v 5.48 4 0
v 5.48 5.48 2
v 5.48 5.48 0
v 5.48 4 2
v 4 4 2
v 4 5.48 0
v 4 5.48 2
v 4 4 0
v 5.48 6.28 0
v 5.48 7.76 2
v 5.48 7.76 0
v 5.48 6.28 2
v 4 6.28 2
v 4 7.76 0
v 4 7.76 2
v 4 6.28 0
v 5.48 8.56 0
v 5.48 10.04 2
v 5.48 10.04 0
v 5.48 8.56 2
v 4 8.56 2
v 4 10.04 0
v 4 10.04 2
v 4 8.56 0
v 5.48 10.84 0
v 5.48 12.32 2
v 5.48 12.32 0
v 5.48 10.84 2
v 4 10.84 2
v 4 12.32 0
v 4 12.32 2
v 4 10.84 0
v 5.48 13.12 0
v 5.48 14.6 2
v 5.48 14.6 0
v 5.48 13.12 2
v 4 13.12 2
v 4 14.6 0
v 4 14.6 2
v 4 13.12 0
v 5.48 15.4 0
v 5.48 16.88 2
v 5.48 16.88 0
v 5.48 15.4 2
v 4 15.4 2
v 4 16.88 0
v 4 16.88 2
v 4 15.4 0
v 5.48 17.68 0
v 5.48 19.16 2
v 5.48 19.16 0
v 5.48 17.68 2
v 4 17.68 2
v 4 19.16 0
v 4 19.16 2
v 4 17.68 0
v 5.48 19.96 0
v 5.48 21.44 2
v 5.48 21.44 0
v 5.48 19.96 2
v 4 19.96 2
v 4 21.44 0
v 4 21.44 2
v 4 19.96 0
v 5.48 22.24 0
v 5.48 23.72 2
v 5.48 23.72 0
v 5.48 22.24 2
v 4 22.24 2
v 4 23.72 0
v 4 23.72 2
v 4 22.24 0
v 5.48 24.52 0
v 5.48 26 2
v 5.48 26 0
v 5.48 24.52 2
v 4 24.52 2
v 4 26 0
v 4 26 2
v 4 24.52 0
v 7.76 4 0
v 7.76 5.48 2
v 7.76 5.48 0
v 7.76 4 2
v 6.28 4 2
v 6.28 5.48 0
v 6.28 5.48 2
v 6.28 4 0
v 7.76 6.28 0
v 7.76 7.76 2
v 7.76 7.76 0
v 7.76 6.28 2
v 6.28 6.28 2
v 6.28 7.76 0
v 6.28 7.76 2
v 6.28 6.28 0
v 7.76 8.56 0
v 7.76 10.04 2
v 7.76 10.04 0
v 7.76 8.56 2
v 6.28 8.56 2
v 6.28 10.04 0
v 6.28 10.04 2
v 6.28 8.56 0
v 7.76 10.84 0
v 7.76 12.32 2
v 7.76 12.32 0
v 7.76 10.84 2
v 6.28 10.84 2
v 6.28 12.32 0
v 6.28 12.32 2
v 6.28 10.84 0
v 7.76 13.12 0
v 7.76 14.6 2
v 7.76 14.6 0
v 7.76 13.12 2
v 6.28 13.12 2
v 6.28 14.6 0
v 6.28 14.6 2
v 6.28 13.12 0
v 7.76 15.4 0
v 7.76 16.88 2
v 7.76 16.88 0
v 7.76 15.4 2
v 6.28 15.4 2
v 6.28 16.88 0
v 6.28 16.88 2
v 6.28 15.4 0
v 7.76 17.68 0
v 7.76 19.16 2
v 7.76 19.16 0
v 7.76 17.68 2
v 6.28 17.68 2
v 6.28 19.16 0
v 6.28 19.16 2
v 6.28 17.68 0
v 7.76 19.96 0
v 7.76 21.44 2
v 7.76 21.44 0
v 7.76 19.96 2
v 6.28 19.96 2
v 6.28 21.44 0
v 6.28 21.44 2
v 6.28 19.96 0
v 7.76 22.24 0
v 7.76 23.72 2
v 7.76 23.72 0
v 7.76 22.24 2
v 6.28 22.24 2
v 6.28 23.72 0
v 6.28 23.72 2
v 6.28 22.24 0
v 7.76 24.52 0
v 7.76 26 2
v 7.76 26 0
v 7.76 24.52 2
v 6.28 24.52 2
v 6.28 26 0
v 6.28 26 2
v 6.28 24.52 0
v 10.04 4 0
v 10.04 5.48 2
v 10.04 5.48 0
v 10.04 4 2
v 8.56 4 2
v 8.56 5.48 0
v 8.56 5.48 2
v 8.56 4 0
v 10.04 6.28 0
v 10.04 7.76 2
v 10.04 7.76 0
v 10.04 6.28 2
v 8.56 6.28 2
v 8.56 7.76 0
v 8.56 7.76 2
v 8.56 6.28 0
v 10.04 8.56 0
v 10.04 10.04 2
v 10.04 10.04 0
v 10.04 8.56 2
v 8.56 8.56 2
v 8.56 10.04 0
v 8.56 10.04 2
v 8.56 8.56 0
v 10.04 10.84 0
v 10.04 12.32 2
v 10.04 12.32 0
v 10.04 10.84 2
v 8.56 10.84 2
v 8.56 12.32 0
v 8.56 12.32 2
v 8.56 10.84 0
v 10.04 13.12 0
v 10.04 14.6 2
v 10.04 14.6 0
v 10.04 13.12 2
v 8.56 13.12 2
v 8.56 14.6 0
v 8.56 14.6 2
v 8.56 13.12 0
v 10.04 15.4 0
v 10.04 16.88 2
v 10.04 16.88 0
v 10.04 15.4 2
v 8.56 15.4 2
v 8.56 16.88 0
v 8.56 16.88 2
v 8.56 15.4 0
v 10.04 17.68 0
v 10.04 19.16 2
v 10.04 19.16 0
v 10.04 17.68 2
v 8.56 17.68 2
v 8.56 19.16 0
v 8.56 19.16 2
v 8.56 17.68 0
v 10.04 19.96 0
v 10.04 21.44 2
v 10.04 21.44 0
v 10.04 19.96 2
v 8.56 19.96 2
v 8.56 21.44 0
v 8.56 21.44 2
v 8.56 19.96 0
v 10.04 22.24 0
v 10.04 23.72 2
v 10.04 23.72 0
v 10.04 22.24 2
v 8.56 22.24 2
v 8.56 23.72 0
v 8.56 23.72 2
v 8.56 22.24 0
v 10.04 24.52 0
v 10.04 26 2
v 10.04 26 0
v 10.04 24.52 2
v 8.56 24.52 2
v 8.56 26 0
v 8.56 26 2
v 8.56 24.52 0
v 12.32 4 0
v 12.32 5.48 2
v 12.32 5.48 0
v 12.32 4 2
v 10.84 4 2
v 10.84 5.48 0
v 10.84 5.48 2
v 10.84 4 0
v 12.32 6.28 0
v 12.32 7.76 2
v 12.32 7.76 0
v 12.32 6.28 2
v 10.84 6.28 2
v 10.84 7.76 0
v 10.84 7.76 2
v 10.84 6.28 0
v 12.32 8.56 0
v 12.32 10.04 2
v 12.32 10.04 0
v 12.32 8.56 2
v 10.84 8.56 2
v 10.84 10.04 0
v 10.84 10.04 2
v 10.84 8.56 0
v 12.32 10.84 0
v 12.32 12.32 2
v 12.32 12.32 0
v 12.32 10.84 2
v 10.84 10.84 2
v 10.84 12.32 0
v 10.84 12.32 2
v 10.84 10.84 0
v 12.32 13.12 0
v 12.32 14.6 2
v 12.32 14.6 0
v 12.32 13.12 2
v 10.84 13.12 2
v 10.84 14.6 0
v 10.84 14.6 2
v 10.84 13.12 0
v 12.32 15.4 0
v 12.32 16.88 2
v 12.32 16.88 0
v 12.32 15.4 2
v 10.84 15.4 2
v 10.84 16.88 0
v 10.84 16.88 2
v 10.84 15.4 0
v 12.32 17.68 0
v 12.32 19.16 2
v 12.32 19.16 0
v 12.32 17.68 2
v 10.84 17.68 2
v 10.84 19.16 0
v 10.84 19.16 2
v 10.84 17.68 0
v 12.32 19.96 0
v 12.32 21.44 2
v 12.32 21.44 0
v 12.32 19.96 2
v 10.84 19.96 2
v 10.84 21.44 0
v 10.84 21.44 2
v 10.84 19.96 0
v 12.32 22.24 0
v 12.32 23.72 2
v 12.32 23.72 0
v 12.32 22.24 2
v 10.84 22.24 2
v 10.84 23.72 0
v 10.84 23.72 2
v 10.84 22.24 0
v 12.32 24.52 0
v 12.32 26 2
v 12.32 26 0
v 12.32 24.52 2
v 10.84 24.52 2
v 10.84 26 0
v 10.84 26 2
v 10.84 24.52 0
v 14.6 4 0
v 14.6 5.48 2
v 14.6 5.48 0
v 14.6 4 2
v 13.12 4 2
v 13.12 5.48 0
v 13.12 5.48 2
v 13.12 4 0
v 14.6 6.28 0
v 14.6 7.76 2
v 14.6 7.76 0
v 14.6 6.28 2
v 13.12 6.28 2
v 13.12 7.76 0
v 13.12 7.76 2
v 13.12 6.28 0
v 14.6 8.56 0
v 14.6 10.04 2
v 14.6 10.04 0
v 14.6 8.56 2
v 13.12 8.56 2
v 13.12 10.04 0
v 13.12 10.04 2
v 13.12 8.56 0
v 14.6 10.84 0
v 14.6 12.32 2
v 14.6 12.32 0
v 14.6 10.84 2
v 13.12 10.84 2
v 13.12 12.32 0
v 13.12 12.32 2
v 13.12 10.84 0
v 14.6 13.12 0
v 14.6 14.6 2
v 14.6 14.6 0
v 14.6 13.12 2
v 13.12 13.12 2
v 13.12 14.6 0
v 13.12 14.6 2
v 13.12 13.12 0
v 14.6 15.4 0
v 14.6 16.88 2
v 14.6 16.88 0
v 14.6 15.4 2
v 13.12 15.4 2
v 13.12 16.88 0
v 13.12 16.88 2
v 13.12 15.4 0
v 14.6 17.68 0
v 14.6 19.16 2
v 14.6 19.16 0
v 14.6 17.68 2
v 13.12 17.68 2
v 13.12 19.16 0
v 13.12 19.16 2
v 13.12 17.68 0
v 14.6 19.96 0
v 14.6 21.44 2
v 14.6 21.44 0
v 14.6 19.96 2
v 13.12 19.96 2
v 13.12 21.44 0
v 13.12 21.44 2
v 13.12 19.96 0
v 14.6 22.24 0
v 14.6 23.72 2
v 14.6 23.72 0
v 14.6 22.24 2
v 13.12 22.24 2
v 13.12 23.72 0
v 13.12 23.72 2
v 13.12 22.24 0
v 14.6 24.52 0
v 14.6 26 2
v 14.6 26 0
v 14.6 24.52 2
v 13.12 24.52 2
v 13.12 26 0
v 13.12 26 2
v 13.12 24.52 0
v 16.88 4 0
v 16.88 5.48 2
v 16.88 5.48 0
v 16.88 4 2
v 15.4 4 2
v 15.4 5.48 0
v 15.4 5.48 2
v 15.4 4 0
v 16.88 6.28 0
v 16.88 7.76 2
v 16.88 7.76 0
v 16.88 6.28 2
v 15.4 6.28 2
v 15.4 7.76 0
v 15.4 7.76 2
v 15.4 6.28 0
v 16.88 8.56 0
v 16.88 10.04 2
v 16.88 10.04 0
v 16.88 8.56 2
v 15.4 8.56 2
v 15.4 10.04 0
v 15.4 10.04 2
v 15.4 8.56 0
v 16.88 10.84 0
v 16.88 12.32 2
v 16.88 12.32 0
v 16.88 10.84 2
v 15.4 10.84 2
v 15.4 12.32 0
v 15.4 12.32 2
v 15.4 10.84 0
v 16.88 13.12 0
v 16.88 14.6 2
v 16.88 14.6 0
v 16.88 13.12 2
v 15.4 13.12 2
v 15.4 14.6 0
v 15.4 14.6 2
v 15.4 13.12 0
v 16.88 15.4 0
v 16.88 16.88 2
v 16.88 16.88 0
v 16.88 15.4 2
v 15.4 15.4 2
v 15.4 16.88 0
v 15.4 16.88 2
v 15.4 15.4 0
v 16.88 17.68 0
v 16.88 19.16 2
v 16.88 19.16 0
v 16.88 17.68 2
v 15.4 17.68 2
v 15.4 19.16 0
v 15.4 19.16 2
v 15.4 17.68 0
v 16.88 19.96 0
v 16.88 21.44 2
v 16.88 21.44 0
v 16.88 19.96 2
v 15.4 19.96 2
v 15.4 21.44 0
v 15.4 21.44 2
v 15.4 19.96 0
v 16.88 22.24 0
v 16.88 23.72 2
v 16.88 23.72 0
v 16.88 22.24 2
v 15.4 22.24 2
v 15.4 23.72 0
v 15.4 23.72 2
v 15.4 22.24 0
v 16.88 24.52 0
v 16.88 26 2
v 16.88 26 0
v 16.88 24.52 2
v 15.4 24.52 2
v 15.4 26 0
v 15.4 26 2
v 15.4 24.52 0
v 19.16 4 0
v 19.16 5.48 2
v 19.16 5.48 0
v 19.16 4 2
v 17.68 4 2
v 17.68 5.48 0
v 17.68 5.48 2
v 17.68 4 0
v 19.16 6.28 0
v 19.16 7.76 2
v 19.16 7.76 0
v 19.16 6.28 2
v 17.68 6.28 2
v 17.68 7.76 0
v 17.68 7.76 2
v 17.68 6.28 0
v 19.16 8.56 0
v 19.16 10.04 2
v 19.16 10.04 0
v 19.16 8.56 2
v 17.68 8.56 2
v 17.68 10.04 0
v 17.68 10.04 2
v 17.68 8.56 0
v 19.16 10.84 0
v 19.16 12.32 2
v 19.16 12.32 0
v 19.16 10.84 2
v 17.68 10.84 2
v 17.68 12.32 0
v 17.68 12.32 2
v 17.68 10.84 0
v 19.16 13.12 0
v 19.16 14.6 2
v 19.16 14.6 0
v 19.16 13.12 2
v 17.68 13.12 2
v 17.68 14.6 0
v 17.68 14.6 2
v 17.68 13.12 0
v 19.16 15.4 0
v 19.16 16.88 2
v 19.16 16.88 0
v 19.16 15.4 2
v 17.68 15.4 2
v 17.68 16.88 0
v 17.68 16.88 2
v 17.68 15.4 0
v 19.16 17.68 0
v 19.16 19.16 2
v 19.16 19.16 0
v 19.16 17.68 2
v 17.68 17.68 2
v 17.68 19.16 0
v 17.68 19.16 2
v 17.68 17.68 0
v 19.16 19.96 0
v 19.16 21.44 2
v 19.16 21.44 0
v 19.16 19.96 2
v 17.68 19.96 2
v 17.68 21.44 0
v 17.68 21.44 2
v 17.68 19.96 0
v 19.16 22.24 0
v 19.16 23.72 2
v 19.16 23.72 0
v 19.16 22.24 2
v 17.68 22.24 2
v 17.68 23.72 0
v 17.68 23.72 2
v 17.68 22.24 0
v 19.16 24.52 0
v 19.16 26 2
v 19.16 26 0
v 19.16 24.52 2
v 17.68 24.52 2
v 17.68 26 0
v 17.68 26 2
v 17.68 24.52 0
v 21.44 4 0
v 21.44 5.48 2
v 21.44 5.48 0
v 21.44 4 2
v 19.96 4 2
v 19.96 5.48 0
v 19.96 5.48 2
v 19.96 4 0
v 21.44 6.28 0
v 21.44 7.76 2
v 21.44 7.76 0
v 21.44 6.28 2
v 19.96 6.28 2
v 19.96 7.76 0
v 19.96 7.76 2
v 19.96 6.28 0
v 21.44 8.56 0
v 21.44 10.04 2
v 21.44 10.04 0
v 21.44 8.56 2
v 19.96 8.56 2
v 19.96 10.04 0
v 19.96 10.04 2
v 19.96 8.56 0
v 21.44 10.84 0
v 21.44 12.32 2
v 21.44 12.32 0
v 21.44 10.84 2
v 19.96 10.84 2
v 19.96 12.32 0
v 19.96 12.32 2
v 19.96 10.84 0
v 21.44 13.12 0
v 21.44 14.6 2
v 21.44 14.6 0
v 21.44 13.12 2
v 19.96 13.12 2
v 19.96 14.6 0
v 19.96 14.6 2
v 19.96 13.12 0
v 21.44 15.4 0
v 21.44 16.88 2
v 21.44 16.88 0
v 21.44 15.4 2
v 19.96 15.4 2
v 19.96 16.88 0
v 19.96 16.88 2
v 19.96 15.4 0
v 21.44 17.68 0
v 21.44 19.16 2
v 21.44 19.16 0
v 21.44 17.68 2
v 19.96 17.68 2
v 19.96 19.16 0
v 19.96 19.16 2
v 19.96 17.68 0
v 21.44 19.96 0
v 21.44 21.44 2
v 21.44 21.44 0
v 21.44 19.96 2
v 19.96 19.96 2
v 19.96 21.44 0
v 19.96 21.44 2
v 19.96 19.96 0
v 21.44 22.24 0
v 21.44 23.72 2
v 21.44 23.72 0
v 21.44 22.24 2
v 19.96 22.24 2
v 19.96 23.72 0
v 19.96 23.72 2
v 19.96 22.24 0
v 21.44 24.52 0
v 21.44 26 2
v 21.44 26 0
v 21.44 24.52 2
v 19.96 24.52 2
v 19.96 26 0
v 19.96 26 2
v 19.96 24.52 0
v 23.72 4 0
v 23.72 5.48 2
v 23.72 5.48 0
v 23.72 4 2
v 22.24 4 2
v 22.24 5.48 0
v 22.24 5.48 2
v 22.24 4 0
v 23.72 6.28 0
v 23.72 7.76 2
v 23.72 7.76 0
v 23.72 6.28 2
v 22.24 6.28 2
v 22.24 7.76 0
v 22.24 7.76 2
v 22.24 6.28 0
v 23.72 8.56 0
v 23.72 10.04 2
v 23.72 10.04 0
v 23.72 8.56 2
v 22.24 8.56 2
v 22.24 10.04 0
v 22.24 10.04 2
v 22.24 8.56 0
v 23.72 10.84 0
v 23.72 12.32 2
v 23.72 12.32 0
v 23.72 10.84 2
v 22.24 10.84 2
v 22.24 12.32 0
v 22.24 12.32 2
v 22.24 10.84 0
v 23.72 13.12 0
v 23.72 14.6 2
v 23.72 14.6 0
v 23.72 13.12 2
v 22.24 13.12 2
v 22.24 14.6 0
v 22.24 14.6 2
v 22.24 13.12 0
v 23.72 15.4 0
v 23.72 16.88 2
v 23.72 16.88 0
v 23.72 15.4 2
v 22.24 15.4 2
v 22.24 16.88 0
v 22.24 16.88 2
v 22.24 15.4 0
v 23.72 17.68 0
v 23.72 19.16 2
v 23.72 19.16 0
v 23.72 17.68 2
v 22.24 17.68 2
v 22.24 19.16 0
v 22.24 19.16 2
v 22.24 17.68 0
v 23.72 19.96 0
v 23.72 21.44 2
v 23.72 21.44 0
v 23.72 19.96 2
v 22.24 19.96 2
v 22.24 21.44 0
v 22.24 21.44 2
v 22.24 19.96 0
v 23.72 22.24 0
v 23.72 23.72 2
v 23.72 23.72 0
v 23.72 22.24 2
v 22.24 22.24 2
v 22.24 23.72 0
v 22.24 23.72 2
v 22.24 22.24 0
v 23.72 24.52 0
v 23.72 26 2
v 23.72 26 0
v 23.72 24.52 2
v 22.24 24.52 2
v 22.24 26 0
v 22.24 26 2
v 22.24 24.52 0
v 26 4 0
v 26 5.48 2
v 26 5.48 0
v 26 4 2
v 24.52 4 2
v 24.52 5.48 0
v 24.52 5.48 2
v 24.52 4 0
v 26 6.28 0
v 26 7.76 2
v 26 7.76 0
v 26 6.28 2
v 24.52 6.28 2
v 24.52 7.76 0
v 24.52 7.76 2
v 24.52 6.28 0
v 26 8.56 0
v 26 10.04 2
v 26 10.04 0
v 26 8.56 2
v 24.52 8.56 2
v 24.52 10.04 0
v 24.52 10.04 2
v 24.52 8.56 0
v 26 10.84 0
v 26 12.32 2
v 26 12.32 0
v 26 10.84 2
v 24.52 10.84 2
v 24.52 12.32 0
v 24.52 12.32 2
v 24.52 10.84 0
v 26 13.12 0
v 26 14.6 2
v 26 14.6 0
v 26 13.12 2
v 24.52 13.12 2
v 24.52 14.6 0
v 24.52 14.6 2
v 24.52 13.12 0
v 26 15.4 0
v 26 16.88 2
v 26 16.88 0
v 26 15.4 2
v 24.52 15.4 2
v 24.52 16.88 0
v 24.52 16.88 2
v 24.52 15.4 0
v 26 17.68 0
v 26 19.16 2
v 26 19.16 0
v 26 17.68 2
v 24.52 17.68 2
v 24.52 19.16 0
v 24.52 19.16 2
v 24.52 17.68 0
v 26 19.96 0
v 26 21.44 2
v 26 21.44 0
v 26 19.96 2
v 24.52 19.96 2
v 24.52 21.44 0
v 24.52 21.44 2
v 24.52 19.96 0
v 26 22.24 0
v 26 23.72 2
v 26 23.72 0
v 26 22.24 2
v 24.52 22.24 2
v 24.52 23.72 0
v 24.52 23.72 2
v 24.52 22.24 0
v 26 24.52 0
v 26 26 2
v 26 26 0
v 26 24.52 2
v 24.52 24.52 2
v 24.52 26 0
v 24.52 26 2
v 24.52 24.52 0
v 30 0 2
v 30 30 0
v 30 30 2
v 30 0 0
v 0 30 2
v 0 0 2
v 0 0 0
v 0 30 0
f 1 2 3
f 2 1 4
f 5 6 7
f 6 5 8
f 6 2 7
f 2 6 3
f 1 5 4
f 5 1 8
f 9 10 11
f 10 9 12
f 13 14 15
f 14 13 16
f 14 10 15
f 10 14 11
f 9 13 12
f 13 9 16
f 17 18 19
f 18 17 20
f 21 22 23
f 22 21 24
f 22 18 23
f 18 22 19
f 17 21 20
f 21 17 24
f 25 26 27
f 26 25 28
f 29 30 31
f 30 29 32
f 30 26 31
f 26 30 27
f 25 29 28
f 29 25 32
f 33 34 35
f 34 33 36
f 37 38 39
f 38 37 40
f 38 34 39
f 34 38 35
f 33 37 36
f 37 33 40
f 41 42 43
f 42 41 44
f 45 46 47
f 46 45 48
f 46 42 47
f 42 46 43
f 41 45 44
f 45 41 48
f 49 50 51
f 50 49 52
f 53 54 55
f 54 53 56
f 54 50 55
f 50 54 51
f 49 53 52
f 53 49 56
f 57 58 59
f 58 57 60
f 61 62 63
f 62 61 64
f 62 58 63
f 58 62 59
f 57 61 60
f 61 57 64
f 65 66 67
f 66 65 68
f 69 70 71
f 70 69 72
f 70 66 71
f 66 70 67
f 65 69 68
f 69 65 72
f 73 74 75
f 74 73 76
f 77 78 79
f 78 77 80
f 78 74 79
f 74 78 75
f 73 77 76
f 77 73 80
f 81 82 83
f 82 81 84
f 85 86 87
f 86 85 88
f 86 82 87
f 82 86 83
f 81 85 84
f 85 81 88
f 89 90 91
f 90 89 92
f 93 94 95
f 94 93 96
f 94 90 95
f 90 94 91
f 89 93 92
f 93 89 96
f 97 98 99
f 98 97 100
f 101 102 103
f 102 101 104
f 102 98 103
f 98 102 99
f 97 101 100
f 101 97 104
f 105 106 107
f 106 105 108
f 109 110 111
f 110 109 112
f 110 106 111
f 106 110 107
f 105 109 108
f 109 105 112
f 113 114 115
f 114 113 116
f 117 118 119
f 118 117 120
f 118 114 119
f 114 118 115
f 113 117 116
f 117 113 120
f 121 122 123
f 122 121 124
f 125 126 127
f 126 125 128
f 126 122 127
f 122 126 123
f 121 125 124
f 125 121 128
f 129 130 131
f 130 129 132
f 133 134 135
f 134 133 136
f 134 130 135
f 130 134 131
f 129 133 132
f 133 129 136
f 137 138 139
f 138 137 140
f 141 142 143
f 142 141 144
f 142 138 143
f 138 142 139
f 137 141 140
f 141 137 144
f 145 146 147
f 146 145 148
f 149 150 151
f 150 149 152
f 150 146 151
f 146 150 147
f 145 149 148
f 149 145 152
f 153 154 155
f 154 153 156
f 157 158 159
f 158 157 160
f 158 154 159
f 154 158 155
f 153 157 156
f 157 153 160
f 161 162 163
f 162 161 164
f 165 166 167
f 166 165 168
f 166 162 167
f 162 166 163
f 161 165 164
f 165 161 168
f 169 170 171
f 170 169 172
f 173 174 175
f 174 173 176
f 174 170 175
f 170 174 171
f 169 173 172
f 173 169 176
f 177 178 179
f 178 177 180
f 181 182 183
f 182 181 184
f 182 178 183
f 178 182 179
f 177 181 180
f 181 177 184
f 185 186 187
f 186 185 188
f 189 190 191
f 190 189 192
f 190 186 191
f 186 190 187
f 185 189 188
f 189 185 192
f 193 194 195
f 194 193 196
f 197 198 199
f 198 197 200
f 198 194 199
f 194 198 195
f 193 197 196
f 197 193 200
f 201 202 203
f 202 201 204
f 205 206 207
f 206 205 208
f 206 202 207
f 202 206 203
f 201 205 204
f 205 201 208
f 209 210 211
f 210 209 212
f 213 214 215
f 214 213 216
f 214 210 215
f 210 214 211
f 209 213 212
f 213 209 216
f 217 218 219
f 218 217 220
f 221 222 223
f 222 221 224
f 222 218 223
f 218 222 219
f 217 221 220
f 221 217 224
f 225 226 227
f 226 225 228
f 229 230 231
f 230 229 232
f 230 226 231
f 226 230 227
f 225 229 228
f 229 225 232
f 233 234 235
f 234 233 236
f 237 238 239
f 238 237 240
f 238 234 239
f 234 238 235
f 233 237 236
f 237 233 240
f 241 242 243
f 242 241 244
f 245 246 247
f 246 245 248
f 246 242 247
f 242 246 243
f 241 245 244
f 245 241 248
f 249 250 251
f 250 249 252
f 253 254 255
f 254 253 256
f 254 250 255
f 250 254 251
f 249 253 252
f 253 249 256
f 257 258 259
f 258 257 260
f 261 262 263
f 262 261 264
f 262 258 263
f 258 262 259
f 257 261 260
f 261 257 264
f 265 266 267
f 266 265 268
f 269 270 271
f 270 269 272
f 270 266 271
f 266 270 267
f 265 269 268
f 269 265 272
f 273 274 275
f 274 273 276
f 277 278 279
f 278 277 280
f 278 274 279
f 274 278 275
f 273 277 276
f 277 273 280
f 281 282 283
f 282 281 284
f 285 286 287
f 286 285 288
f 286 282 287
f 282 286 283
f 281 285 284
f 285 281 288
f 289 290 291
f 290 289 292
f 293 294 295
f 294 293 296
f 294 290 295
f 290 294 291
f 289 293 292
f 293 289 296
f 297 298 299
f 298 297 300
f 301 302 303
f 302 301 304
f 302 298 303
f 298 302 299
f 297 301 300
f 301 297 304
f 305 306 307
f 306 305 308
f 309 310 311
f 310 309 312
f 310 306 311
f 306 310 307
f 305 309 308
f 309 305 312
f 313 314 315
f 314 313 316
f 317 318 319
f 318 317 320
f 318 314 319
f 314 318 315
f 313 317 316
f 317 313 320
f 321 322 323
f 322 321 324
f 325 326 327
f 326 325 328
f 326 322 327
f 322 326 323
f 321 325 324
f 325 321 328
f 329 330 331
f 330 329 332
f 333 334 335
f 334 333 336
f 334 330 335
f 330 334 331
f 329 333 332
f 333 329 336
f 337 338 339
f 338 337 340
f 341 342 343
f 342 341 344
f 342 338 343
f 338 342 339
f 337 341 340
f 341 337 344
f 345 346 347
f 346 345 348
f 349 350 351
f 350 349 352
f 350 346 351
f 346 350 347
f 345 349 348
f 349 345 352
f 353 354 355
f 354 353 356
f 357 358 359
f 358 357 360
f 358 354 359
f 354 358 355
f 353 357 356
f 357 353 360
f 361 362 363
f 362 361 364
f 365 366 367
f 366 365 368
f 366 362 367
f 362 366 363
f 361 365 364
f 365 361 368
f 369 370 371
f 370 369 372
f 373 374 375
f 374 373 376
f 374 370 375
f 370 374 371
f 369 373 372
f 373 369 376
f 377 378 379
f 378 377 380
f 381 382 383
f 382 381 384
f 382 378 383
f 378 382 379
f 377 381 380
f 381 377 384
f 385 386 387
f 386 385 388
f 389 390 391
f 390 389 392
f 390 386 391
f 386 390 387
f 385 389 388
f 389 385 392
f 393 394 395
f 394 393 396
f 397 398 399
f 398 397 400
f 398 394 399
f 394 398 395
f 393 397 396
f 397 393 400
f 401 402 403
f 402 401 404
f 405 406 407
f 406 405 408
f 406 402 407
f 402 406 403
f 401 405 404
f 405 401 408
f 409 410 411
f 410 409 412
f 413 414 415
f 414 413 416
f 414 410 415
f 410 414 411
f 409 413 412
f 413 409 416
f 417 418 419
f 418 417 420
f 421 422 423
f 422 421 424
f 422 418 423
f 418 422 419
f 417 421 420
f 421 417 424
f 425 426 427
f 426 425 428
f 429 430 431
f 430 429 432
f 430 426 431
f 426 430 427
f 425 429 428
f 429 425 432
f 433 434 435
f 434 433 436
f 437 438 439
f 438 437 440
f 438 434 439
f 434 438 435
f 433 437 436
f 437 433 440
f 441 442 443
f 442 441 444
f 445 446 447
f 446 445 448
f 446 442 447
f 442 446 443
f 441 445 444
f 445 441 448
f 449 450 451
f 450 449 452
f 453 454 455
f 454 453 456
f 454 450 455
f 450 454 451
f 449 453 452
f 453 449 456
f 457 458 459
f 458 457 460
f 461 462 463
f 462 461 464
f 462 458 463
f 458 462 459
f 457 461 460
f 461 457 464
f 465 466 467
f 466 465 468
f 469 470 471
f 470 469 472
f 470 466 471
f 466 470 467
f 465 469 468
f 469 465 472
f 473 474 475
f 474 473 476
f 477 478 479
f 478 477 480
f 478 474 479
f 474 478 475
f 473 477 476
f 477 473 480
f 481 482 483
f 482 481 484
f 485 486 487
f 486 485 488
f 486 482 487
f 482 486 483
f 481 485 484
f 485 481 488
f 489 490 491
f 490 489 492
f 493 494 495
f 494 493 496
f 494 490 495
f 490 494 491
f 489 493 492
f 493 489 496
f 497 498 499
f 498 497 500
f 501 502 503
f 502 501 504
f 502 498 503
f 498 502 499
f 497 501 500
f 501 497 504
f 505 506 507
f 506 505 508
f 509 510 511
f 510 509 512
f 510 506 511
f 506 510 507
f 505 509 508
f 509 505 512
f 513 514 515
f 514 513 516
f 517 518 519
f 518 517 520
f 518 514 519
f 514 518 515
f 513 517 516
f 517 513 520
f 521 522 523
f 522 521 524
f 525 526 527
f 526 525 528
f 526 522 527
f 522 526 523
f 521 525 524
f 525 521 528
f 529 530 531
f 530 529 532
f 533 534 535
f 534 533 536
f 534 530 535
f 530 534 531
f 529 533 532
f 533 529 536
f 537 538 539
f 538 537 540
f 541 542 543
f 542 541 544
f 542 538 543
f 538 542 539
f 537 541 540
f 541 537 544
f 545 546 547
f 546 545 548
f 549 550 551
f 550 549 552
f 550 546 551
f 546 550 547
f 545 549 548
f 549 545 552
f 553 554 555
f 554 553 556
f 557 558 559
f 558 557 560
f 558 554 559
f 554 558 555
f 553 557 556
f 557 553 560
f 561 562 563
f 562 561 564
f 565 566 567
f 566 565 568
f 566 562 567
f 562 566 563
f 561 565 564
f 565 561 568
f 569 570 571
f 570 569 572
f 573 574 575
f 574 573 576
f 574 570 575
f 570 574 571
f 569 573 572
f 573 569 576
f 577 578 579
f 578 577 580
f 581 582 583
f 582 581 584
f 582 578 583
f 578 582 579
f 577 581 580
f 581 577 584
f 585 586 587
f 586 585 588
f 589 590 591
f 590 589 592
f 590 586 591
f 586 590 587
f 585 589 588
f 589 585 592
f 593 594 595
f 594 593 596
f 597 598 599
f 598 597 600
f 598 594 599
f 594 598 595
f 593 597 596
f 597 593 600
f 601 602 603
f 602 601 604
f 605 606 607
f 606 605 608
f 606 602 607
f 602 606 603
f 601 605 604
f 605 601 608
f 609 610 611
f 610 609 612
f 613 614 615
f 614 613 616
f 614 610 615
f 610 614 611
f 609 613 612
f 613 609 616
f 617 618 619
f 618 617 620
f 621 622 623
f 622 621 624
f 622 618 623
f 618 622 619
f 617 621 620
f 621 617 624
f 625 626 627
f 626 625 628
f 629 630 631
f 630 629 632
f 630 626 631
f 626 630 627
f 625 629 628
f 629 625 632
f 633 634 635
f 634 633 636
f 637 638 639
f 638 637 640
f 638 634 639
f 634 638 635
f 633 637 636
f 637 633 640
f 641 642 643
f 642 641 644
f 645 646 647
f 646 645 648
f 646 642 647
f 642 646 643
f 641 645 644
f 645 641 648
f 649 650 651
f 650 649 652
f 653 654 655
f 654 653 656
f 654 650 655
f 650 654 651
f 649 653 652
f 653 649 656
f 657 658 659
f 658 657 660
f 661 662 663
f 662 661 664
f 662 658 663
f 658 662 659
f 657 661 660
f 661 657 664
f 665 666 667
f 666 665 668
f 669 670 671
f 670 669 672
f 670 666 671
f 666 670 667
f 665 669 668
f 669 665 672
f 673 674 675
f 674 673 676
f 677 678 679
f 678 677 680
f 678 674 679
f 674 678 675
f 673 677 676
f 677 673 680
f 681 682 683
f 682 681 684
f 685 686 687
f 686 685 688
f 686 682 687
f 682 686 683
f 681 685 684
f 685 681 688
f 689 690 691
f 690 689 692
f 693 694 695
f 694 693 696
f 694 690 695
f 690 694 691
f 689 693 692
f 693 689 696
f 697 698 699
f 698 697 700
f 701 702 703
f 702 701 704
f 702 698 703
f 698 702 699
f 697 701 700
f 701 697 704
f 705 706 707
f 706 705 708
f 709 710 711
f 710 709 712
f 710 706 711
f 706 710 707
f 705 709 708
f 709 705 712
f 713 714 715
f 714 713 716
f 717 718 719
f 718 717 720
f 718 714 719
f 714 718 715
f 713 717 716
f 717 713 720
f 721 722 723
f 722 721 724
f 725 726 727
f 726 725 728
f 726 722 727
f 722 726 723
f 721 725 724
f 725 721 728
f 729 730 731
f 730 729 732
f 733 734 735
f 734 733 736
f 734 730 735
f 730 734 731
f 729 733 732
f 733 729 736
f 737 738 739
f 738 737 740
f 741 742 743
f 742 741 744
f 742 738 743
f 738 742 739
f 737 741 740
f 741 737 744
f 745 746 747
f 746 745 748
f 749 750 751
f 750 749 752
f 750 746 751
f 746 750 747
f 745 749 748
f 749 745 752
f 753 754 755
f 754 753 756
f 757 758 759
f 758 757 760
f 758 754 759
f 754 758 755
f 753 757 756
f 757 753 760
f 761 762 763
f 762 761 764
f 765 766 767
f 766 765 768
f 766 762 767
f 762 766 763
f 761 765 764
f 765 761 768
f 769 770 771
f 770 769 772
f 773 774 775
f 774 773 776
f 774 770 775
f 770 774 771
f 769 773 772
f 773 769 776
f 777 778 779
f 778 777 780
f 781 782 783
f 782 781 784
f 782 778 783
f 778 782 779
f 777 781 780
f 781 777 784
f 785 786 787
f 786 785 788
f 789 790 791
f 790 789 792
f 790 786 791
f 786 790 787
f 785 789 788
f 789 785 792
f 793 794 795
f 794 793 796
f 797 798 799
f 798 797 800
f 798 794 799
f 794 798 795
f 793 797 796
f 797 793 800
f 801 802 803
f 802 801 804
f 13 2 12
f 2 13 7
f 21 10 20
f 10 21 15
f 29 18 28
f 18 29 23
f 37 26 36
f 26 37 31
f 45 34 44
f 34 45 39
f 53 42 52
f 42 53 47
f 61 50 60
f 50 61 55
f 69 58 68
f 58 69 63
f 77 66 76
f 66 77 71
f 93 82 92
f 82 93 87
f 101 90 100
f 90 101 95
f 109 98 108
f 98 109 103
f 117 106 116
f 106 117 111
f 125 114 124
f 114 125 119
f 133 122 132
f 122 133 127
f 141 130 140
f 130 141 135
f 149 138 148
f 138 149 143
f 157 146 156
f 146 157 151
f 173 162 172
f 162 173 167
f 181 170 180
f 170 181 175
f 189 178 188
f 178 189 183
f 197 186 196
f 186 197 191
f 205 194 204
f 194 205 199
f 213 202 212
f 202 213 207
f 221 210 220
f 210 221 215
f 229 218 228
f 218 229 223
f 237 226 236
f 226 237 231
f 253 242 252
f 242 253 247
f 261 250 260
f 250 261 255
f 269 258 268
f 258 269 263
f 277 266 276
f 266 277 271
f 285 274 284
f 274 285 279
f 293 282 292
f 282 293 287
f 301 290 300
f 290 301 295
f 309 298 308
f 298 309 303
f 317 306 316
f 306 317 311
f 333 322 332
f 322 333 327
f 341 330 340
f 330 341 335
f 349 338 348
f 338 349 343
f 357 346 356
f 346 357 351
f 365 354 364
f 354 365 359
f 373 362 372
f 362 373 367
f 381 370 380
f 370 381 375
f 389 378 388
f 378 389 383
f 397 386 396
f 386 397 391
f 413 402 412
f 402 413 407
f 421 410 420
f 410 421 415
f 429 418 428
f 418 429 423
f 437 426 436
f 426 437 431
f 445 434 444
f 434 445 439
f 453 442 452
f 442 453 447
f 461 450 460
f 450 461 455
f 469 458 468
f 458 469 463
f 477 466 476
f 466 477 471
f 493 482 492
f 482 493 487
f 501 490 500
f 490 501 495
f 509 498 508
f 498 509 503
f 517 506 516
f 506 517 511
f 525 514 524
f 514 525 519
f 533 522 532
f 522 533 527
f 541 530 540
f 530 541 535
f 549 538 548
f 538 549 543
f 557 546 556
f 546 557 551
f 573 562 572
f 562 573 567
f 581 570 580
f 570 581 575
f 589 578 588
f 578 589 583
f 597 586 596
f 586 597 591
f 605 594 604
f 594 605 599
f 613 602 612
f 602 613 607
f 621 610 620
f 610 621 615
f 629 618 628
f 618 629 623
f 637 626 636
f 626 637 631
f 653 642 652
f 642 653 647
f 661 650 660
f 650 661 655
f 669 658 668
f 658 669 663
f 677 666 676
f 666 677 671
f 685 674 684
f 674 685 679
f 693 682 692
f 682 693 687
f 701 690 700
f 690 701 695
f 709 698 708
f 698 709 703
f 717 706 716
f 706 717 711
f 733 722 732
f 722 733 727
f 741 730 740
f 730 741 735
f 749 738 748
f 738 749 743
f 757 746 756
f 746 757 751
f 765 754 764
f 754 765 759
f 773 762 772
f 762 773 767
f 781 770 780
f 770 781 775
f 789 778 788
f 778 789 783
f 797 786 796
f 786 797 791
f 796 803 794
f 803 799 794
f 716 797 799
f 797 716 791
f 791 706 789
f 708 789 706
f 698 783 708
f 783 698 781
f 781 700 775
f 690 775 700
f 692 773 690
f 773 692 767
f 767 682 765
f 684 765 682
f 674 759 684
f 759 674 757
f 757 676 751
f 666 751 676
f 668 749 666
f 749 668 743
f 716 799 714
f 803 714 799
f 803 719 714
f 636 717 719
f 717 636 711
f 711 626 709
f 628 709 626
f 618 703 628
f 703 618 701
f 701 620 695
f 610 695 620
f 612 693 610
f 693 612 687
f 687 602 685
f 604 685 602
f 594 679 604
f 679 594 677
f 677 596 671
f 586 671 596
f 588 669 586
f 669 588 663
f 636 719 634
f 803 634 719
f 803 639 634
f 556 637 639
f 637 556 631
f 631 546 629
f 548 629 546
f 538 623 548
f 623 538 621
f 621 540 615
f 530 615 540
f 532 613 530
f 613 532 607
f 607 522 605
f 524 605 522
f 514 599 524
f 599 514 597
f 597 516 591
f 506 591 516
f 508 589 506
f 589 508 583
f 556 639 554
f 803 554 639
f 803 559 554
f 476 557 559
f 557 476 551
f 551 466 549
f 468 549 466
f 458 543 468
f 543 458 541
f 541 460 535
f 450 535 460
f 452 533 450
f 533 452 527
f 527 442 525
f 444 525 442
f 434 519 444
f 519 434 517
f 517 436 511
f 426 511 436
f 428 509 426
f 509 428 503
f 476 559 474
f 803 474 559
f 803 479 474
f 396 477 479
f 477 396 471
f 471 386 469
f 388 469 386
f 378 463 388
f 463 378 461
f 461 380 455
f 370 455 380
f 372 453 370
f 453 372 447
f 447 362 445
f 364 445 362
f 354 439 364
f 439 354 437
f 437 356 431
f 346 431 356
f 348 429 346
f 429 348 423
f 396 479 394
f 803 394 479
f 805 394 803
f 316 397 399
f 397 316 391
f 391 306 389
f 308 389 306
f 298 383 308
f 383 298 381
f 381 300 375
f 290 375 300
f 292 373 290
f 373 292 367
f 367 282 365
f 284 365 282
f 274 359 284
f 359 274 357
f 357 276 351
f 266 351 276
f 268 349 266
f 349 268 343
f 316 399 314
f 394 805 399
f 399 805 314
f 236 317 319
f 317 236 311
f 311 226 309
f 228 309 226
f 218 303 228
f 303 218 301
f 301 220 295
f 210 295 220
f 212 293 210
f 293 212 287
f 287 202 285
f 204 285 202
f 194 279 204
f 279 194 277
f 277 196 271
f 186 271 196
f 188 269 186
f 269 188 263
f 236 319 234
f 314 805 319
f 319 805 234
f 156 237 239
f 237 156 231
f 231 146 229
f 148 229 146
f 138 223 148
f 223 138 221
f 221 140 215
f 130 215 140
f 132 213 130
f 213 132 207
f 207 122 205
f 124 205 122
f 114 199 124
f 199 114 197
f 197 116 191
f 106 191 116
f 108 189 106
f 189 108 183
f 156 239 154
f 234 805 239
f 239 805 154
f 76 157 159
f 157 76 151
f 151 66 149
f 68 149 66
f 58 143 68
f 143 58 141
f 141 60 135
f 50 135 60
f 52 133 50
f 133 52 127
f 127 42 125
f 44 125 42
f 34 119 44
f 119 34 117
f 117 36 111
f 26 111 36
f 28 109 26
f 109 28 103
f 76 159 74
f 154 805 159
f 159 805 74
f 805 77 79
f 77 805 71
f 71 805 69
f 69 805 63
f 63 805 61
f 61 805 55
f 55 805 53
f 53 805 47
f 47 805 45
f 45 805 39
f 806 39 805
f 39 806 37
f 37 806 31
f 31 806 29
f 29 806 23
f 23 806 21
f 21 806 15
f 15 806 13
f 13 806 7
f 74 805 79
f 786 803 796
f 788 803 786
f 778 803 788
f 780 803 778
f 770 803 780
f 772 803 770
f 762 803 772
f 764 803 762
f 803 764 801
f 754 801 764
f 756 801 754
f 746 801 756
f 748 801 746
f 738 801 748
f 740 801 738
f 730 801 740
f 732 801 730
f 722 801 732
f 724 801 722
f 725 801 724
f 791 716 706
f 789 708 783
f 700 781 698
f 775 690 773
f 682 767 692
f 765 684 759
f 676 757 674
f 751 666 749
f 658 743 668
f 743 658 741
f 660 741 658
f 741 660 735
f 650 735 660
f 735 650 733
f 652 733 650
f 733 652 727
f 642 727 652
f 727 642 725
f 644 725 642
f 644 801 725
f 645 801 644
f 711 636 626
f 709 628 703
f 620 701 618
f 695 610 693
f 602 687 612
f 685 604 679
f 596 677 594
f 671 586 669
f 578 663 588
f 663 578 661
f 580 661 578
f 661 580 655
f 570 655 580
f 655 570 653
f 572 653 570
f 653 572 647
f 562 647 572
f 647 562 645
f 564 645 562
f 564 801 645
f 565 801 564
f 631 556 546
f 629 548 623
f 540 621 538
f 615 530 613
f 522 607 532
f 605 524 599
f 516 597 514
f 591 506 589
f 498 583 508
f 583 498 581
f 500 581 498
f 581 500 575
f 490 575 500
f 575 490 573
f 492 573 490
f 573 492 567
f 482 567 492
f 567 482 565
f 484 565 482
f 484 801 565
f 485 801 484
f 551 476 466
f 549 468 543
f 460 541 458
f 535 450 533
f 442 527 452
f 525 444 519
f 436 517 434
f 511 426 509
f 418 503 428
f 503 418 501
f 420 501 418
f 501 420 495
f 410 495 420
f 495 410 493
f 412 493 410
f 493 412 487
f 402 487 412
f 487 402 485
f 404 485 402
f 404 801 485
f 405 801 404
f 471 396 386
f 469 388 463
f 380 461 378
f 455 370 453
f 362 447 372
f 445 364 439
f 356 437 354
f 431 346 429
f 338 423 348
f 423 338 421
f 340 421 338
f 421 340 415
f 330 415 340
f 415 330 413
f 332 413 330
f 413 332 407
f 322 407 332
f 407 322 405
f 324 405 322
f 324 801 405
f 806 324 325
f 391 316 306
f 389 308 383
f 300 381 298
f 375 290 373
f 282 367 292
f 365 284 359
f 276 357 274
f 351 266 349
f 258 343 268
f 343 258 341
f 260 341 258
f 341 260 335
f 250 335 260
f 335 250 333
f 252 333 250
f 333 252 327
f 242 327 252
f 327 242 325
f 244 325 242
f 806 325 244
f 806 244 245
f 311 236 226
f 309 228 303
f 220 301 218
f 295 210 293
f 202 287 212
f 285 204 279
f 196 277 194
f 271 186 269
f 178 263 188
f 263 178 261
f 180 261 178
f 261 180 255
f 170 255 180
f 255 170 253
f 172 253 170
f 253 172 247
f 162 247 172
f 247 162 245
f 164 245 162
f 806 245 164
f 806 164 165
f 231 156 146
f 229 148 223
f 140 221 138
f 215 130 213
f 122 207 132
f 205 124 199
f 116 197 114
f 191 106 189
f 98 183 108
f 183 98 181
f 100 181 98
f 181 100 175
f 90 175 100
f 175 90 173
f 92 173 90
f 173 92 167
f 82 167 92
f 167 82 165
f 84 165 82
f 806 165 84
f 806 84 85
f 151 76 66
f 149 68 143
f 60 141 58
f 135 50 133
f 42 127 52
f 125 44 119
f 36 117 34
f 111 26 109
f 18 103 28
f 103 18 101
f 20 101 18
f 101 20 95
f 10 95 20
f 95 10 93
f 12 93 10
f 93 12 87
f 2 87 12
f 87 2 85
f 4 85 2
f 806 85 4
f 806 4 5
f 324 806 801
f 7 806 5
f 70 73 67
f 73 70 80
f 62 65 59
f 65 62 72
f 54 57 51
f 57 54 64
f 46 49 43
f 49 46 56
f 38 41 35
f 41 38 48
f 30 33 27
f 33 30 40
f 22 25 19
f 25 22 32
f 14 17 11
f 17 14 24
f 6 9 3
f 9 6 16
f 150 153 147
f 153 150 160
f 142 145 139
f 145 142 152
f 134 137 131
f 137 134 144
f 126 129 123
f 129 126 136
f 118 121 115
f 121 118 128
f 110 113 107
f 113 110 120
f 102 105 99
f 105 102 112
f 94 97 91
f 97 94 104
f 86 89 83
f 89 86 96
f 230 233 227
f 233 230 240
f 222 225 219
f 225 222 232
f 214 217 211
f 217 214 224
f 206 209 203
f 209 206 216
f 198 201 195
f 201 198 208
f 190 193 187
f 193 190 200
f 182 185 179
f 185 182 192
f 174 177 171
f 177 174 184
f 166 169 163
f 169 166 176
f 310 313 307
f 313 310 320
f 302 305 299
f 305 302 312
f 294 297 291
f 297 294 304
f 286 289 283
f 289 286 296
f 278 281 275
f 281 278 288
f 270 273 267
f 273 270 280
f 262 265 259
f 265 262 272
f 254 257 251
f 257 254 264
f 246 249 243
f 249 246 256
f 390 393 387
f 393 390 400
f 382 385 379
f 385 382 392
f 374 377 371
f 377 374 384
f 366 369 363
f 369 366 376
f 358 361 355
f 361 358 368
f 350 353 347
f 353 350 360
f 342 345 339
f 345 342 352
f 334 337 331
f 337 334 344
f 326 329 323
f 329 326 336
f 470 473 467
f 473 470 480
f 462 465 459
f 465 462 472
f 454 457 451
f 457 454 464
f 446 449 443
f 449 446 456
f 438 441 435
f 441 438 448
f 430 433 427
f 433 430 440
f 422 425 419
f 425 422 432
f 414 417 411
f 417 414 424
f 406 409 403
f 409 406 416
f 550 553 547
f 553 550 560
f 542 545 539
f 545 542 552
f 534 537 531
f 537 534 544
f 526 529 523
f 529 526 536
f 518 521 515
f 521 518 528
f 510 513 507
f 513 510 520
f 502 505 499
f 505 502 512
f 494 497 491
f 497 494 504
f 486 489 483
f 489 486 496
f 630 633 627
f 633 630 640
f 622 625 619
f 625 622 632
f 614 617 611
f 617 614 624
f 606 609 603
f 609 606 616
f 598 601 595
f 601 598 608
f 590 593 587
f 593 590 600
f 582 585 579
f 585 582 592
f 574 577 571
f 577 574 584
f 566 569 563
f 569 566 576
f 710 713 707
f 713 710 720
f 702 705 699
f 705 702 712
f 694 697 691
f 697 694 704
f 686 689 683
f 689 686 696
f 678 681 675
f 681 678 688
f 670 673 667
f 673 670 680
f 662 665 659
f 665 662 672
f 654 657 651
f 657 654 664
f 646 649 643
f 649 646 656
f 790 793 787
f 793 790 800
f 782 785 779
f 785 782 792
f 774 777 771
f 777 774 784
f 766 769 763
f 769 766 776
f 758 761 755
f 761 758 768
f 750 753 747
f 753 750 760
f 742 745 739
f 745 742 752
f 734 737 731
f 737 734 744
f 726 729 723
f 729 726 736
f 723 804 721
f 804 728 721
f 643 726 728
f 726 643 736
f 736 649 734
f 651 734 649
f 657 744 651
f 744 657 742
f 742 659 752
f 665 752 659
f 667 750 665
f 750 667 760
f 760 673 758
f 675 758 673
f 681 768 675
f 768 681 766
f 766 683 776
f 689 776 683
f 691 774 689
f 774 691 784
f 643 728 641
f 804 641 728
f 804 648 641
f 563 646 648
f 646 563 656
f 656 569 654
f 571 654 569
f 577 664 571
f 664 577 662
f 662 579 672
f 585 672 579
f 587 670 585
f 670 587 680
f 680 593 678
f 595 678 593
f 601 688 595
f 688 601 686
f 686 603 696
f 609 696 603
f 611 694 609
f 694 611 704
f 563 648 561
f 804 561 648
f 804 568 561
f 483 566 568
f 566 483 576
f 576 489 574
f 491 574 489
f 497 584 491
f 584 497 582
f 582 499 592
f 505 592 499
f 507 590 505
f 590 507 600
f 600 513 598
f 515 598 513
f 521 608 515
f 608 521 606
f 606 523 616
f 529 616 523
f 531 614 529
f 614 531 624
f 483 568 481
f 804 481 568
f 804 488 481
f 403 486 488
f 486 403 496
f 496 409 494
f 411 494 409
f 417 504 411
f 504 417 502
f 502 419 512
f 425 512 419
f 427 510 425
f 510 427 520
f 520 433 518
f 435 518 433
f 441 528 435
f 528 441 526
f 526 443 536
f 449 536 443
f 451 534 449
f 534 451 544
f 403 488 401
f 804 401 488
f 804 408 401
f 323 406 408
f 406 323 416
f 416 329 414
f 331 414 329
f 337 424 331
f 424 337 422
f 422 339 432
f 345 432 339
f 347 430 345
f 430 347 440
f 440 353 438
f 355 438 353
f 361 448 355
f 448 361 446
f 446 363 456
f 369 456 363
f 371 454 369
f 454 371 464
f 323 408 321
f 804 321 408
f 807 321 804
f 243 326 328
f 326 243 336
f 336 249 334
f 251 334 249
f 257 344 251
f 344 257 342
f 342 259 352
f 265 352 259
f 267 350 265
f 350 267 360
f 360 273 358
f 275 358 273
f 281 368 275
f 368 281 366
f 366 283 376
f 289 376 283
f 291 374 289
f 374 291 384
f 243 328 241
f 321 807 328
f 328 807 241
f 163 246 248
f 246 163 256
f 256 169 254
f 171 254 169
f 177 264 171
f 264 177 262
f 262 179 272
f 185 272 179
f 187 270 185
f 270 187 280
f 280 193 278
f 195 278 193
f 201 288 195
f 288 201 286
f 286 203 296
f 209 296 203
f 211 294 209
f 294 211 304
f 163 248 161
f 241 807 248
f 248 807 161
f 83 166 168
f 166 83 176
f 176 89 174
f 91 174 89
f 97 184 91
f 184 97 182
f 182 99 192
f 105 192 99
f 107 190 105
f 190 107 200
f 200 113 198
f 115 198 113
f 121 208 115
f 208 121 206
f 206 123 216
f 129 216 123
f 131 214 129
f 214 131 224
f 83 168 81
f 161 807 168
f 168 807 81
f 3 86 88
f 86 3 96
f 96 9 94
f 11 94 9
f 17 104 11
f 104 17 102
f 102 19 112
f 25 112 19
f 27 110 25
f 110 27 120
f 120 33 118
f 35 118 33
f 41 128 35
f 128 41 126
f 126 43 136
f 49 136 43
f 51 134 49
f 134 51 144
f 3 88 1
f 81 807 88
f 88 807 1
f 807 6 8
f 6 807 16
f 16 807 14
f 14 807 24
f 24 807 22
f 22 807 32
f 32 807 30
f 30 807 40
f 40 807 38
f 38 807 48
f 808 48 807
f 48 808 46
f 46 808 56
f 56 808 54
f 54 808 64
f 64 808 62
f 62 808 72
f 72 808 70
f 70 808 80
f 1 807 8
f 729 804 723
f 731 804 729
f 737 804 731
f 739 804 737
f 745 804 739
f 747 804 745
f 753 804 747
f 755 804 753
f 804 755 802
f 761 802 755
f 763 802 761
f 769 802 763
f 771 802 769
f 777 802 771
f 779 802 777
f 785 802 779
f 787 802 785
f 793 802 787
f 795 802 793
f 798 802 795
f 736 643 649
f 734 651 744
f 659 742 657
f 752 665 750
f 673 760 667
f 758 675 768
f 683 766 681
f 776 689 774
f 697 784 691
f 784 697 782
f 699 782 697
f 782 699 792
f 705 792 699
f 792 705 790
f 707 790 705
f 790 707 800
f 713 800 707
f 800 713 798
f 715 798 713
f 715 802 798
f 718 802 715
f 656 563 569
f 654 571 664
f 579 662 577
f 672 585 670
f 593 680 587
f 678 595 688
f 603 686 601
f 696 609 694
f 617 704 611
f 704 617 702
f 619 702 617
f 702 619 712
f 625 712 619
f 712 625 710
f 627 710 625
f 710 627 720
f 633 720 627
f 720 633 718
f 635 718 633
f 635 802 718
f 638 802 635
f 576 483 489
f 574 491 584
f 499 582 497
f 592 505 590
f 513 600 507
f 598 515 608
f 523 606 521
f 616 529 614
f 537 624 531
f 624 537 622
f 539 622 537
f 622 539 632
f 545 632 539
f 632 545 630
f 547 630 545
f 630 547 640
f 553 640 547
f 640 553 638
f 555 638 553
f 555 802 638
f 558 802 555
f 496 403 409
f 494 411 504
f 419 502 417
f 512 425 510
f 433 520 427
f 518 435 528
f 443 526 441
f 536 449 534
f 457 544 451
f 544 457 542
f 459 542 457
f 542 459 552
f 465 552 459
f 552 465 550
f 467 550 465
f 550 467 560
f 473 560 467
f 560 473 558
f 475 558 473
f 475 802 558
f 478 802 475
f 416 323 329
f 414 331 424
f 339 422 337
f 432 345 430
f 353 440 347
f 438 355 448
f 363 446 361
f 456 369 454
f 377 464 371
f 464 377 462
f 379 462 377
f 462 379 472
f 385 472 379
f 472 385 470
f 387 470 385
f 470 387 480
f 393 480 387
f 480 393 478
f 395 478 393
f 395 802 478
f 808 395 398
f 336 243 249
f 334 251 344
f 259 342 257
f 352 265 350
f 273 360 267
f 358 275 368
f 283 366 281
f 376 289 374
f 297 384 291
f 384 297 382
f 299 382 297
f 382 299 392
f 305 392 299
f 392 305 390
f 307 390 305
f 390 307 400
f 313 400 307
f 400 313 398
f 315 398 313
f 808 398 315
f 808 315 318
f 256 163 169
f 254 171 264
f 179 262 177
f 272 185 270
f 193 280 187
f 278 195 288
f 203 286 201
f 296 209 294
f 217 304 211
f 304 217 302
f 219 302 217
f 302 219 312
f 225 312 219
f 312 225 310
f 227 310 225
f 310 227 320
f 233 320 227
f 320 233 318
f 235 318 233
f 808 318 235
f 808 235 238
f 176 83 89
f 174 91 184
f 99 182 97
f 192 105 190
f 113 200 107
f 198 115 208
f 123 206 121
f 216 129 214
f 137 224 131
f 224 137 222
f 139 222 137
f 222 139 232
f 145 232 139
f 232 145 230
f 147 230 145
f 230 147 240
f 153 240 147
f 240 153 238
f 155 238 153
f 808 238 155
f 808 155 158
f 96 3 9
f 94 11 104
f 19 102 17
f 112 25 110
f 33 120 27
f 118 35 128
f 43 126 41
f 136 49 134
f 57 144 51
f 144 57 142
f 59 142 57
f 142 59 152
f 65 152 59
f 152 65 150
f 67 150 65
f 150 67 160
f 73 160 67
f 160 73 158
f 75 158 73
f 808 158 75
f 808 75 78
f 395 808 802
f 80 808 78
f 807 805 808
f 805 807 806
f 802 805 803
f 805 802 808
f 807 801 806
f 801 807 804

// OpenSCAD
// Grid
// By Dana Woodman <dana@danawoodman.com>


// Settings
//--------------------------

/* [Global] */

// The width of the exported file.
width = 30;

// The height of the exported file.
height = 30;

// The number of columns to generate.
cols = 10;

// The number of rows to generate.
rows = 10;

// The border around the grids/slats
border = 4;

// The spacing between rows/columns.
spacing = .8;

//thickness
thickness = 2;

/* [Hidden] */

// The magic...
//--------------------------

// Calculated inner width of dispaly area.
innerWidth = (width - (2 * border));
innerHeight = (height - (2 * border));
//echo("innerWidth", innerWidth, "innerHeight", innerHeight);

// Calculate size of the squares.
function dimension(size, divisions) = (size - ((divisions - 1) * spacing)) / divisions;
xWidth = dimension(innerWidth, cols);
yWidth = dimension(innerHeight, rows);
//echo("xWidth", xWidth, "yWidth", yWidth);

function calculate_location(size, index, spacing) = (size + spacing) * index;

eps=.001;
// Subtract the squares from the display area.
difference() {

	// The display area.
	cube(size=[width, height,thickness]);

	// Offset by border size.
	translate([border, border,-eps])

		// Iterate over all the columns.
		for (col = [0 : cols - 1]) {
			
			// Iterate over all the rows.
			for (row = [0 : rows - 1]) {

				// Caclulate position of each square
				translate([
					calculate_location(xWidth, col, spacing), 
					calculate_location(yWidth, row, spacing)
				])
					cube(size=[xWidth, yWidth,2*thickness]);
			}
		}
}
